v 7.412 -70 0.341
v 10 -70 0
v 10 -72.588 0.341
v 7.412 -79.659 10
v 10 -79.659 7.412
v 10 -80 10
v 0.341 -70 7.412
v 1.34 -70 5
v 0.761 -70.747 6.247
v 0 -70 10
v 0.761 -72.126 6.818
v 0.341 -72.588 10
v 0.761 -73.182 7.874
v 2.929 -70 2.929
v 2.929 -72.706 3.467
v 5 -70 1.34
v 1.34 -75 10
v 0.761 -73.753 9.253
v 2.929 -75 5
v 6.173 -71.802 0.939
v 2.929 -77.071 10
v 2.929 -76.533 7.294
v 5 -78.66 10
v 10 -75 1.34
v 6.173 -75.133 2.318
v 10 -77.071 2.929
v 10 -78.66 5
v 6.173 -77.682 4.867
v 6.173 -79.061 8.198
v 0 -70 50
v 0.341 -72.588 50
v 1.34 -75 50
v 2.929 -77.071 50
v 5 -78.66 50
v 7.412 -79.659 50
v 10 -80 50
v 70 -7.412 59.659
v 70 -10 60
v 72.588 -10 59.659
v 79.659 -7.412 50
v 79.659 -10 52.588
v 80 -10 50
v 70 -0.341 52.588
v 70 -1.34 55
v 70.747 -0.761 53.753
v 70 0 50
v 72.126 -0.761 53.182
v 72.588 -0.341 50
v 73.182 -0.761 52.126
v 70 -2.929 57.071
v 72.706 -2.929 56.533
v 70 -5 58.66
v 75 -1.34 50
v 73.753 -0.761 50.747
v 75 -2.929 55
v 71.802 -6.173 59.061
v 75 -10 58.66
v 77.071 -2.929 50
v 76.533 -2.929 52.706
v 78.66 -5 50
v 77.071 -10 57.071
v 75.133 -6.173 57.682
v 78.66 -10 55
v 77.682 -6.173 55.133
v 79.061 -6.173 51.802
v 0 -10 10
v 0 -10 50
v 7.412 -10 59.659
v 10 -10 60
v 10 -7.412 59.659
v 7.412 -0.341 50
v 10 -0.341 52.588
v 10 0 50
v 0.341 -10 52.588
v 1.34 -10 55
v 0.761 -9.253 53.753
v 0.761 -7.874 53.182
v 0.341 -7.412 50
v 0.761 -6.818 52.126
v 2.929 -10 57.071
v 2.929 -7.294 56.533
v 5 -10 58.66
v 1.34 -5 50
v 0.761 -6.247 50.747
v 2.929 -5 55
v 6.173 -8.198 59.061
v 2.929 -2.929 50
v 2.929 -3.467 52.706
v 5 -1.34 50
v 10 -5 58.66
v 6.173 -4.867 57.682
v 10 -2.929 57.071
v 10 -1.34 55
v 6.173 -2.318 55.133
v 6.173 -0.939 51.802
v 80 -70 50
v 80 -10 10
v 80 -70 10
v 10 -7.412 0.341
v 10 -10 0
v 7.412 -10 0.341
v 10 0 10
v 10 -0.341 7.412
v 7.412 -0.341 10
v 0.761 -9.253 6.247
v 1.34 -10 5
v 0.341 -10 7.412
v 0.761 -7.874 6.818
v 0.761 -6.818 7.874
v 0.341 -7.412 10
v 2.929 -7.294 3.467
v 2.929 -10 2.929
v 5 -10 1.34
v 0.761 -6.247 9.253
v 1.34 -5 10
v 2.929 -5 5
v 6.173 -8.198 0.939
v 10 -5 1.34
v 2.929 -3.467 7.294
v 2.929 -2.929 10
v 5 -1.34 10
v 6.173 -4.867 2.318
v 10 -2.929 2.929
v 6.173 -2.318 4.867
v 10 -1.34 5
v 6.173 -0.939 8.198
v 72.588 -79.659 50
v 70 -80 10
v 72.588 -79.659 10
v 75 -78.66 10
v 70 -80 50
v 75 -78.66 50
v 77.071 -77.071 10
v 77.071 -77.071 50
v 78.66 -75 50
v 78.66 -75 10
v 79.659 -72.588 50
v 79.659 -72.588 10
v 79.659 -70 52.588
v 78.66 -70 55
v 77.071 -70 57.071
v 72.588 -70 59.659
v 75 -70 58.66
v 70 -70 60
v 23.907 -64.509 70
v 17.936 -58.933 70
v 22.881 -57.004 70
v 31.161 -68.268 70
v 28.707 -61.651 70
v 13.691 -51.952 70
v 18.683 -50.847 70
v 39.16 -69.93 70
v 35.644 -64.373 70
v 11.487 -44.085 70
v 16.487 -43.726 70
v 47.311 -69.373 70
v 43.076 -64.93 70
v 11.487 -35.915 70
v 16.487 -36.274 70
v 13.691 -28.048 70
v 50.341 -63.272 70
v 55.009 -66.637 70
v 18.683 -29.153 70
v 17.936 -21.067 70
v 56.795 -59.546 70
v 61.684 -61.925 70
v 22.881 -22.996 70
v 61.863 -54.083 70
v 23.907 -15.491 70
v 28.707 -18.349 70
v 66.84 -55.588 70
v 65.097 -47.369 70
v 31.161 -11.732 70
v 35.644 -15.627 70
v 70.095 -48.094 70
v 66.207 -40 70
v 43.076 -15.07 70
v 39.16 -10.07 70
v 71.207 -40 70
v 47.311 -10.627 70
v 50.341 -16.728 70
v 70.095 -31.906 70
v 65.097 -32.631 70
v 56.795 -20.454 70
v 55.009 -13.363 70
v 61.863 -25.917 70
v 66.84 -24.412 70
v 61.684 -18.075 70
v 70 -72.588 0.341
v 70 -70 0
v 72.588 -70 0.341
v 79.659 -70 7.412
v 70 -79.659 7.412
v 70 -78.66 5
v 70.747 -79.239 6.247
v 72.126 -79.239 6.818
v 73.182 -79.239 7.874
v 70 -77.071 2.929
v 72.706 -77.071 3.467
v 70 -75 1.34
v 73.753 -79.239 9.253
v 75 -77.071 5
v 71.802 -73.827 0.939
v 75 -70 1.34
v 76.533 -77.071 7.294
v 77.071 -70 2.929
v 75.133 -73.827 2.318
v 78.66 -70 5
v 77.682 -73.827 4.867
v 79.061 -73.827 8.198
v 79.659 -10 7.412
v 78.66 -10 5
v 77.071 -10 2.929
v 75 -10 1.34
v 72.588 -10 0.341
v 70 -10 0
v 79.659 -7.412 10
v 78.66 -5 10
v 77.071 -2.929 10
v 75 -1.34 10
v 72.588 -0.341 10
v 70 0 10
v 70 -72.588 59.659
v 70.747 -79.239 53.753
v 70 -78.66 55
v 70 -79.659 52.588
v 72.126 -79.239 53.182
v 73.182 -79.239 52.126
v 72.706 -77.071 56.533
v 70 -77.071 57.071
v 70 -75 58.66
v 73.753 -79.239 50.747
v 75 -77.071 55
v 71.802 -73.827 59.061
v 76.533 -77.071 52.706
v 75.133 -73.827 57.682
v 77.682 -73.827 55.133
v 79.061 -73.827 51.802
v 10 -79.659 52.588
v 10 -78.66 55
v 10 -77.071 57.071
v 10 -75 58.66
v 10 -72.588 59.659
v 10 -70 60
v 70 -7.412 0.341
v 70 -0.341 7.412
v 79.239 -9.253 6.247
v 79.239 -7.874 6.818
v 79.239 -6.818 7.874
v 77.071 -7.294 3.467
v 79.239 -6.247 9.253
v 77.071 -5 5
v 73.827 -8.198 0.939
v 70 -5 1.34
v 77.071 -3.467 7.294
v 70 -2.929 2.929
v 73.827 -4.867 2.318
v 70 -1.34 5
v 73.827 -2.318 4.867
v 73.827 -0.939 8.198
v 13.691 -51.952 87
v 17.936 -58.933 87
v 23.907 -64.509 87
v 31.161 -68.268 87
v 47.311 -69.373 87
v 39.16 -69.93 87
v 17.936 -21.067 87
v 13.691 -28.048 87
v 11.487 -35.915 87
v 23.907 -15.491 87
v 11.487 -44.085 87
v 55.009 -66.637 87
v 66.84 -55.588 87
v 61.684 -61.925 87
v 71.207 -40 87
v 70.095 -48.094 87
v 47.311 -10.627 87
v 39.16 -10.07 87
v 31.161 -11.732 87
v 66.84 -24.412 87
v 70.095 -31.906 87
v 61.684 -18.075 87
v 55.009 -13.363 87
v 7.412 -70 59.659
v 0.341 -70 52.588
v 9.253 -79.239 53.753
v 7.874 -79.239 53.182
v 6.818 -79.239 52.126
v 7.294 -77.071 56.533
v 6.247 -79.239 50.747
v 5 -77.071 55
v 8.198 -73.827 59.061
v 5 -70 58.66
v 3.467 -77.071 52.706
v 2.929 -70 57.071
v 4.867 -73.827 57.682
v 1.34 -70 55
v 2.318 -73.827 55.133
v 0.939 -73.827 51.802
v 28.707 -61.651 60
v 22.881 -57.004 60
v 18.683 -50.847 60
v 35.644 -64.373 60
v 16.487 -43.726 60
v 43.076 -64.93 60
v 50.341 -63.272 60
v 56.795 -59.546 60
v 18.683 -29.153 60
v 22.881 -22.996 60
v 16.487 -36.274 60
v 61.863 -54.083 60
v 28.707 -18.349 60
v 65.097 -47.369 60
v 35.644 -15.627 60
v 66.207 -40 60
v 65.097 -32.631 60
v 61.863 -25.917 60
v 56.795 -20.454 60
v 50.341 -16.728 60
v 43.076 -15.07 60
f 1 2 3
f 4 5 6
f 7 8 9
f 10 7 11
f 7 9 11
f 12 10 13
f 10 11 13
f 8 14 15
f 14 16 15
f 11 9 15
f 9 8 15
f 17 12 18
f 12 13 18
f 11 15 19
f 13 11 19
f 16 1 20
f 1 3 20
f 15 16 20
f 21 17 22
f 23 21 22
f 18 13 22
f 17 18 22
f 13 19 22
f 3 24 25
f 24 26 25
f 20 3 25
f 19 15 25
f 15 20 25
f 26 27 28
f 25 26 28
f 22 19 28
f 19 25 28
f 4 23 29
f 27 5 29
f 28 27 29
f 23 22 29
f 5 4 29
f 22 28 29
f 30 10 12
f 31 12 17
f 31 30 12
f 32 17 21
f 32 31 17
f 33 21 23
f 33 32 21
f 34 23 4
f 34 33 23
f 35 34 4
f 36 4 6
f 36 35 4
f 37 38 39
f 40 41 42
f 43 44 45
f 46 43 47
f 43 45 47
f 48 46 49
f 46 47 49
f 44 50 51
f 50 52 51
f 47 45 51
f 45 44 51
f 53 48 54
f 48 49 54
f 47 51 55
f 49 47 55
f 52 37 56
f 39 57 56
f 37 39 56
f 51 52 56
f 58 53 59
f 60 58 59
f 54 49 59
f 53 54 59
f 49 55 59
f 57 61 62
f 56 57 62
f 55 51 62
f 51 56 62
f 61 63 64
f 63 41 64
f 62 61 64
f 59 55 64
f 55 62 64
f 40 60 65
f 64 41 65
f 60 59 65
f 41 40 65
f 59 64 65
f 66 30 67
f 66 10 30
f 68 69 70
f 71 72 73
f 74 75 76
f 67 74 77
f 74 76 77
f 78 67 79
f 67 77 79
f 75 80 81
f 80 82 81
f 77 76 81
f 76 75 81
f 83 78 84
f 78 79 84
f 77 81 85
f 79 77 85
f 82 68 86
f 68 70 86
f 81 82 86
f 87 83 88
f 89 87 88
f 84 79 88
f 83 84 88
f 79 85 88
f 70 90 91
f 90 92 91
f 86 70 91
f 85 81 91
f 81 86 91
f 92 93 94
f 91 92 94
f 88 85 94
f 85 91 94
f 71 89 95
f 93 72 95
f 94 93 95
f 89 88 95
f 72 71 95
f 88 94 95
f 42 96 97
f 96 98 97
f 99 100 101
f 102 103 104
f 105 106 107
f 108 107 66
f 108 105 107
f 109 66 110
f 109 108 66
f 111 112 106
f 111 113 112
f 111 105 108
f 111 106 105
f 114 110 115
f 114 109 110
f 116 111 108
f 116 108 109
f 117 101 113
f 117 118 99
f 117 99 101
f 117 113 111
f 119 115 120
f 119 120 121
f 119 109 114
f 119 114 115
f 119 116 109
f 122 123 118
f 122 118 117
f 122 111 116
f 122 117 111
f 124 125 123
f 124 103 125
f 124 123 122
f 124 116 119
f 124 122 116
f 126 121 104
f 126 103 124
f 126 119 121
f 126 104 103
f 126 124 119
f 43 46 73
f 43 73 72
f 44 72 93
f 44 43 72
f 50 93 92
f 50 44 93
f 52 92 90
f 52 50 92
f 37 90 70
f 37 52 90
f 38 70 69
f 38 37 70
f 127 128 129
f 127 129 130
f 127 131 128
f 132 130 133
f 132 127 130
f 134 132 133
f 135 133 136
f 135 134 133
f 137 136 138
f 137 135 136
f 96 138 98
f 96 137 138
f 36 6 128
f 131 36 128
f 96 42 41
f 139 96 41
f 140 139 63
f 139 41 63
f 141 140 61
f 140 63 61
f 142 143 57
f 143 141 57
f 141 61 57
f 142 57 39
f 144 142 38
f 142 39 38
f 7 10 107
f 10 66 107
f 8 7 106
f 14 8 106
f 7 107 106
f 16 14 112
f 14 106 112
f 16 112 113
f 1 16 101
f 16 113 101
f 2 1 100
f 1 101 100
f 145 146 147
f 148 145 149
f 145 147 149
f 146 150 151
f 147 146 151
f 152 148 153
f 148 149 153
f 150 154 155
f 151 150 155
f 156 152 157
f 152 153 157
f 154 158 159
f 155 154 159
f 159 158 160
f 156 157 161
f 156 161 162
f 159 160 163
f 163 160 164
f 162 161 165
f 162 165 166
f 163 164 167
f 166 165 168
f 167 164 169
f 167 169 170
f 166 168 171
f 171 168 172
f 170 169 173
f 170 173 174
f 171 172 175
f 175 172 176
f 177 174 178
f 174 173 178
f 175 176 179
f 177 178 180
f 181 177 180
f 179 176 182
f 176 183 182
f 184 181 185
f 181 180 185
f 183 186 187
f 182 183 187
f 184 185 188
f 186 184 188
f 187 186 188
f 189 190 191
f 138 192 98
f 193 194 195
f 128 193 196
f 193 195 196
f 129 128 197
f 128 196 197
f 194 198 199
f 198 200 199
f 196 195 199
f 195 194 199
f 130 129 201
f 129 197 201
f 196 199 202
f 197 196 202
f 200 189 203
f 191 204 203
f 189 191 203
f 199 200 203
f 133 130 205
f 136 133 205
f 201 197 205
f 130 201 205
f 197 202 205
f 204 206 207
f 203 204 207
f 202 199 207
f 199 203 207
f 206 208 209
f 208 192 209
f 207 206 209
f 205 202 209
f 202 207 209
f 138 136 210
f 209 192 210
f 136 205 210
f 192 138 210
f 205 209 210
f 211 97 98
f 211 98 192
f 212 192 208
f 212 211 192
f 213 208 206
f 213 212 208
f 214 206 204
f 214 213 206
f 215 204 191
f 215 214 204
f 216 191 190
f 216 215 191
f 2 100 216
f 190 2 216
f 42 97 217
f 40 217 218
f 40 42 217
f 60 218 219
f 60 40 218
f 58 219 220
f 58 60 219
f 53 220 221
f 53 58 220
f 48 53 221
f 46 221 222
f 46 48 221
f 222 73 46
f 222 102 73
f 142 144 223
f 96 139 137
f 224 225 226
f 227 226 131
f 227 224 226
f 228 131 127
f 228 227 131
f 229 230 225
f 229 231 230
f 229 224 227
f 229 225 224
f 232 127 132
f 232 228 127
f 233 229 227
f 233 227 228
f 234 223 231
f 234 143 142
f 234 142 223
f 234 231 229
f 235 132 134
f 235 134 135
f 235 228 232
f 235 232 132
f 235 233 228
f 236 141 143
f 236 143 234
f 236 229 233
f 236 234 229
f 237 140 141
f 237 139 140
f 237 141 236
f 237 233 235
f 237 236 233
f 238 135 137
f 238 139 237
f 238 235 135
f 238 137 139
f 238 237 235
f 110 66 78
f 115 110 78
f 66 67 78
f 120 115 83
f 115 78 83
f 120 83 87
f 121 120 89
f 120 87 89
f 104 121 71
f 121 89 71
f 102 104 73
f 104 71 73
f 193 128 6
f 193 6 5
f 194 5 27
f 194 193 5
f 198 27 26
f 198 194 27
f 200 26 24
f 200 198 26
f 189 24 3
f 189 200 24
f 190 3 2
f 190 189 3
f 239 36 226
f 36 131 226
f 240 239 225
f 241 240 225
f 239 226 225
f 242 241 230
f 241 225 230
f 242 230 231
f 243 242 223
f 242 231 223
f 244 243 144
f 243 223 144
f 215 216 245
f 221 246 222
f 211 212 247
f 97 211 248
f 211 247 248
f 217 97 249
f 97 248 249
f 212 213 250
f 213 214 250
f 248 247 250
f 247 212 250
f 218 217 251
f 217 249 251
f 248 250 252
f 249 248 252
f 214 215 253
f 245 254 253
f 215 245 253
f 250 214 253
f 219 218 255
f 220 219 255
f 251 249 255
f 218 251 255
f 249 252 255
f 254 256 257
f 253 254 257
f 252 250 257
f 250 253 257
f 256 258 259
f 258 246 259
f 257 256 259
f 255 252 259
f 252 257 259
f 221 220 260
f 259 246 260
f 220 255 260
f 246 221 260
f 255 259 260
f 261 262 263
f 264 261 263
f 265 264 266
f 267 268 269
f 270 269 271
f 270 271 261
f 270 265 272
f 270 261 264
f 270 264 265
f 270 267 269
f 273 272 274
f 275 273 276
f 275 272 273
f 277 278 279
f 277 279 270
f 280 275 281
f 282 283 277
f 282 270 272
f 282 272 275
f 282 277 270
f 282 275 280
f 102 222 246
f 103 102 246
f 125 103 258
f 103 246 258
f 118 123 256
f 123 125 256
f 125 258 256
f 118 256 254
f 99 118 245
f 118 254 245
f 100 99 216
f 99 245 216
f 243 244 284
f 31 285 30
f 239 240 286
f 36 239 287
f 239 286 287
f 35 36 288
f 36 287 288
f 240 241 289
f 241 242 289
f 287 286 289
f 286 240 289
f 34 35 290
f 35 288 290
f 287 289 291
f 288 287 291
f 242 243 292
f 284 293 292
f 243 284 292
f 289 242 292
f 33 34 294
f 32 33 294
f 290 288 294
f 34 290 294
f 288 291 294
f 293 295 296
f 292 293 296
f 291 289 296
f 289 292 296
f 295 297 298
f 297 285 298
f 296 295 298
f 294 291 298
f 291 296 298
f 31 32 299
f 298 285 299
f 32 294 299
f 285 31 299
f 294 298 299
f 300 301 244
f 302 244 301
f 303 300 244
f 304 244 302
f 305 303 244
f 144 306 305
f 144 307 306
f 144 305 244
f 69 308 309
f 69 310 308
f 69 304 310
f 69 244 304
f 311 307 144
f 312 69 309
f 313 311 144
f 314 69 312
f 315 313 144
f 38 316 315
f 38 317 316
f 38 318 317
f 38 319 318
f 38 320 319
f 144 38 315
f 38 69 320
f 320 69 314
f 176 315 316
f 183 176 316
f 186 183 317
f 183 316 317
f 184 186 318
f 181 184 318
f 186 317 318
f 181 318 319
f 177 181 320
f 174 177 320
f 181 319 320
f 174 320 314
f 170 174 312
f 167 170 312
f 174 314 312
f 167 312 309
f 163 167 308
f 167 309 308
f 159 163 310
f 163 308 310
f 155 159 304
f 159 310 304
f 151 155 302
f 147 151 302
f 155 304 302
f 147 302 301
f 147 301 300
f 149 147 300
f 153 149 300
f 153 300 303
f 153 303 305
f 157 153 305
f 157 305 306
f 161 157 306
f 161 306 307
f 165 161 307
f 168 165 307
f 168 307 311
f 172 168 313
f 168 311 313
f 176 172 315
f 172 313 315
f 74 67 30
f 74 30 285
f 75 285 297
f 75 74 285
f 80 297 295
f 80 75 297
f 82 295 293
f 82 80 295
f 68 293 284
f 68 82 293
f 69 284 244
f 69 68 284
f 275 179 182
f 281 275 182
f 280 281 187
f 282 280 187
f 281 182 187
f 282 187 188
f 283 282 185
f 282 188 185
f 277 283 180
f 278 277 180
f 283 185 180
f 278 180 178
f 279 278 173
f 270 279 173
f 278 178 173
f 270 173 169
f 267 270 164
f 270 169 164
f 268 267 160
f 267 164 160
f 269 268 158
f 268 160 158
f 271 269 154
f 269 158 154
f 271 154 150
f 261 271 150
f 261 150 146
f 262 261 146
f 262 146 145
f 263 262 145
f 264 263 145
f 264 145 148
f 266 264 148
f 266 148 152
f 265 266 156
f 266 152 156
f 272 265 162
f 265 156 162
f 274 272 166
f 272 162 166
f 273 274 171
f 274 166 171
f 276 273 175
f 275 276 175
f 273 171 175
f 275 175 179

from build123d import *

# Parameters (mm, degrees)
SKETCH_1_W      = 80
SKETCH_1_H      = 80
EXTRUDE_1_DEPTH = 60
FILLET_1_R      = 10
SKETCH_2_R      = 25
EXTRUDE_2_DEPTH = 10
SKETCH_3_R      = 30
EXTRUDE_3_DEPTH = 17


with BuildPart() as part:
    # 스케치1 → 보스-돌출1 (new body)
    with BuildSketch(Plane.XY):
        with Locations((40, -40)):
            Rectangle(SKETCH_1_W, SKETCH_1_H)
    extrude(amount=EXTRUDE_1_DEPTH)

    # 필렛1
    fillet_1_edges = [part.edges().sort_by_distance(p)[0] for p in [
        (80, -40, 60),
        (40, 0, 60),
        (0, -40, 60),
        (40, 0, 0),
        (80, -40, 0),
        (40, -80, 0),
        (0, -40, 0),
        (40, -80, 60),
        (0, 0, 30),
        (80, 0, 30),
        (80, -80, 30),
        (0, -80, 30),
    ]]
    fillet(fillet_1_edges, radius=FILLET_1_R)

    # 스케치2 → 보스-돌출2 (add)
    with BuildSketch(Plane.XY.offset(60)):
        with Locations((41.207439788, -40)):
            Circle(SKETCH_2_R)
    extrude(amount=EXTRUDE_2_DEPTH)

    # 스케치3 → 보스-돌출3 (add)
    with BuildSketch(Plane.XY.offset(70)):
        with Locations((41.207439788, -40)):
            Circle(SKETCH_3_R)
    extrude(amount=EXTRUDE_3_DEPTH)


solid = part.part
